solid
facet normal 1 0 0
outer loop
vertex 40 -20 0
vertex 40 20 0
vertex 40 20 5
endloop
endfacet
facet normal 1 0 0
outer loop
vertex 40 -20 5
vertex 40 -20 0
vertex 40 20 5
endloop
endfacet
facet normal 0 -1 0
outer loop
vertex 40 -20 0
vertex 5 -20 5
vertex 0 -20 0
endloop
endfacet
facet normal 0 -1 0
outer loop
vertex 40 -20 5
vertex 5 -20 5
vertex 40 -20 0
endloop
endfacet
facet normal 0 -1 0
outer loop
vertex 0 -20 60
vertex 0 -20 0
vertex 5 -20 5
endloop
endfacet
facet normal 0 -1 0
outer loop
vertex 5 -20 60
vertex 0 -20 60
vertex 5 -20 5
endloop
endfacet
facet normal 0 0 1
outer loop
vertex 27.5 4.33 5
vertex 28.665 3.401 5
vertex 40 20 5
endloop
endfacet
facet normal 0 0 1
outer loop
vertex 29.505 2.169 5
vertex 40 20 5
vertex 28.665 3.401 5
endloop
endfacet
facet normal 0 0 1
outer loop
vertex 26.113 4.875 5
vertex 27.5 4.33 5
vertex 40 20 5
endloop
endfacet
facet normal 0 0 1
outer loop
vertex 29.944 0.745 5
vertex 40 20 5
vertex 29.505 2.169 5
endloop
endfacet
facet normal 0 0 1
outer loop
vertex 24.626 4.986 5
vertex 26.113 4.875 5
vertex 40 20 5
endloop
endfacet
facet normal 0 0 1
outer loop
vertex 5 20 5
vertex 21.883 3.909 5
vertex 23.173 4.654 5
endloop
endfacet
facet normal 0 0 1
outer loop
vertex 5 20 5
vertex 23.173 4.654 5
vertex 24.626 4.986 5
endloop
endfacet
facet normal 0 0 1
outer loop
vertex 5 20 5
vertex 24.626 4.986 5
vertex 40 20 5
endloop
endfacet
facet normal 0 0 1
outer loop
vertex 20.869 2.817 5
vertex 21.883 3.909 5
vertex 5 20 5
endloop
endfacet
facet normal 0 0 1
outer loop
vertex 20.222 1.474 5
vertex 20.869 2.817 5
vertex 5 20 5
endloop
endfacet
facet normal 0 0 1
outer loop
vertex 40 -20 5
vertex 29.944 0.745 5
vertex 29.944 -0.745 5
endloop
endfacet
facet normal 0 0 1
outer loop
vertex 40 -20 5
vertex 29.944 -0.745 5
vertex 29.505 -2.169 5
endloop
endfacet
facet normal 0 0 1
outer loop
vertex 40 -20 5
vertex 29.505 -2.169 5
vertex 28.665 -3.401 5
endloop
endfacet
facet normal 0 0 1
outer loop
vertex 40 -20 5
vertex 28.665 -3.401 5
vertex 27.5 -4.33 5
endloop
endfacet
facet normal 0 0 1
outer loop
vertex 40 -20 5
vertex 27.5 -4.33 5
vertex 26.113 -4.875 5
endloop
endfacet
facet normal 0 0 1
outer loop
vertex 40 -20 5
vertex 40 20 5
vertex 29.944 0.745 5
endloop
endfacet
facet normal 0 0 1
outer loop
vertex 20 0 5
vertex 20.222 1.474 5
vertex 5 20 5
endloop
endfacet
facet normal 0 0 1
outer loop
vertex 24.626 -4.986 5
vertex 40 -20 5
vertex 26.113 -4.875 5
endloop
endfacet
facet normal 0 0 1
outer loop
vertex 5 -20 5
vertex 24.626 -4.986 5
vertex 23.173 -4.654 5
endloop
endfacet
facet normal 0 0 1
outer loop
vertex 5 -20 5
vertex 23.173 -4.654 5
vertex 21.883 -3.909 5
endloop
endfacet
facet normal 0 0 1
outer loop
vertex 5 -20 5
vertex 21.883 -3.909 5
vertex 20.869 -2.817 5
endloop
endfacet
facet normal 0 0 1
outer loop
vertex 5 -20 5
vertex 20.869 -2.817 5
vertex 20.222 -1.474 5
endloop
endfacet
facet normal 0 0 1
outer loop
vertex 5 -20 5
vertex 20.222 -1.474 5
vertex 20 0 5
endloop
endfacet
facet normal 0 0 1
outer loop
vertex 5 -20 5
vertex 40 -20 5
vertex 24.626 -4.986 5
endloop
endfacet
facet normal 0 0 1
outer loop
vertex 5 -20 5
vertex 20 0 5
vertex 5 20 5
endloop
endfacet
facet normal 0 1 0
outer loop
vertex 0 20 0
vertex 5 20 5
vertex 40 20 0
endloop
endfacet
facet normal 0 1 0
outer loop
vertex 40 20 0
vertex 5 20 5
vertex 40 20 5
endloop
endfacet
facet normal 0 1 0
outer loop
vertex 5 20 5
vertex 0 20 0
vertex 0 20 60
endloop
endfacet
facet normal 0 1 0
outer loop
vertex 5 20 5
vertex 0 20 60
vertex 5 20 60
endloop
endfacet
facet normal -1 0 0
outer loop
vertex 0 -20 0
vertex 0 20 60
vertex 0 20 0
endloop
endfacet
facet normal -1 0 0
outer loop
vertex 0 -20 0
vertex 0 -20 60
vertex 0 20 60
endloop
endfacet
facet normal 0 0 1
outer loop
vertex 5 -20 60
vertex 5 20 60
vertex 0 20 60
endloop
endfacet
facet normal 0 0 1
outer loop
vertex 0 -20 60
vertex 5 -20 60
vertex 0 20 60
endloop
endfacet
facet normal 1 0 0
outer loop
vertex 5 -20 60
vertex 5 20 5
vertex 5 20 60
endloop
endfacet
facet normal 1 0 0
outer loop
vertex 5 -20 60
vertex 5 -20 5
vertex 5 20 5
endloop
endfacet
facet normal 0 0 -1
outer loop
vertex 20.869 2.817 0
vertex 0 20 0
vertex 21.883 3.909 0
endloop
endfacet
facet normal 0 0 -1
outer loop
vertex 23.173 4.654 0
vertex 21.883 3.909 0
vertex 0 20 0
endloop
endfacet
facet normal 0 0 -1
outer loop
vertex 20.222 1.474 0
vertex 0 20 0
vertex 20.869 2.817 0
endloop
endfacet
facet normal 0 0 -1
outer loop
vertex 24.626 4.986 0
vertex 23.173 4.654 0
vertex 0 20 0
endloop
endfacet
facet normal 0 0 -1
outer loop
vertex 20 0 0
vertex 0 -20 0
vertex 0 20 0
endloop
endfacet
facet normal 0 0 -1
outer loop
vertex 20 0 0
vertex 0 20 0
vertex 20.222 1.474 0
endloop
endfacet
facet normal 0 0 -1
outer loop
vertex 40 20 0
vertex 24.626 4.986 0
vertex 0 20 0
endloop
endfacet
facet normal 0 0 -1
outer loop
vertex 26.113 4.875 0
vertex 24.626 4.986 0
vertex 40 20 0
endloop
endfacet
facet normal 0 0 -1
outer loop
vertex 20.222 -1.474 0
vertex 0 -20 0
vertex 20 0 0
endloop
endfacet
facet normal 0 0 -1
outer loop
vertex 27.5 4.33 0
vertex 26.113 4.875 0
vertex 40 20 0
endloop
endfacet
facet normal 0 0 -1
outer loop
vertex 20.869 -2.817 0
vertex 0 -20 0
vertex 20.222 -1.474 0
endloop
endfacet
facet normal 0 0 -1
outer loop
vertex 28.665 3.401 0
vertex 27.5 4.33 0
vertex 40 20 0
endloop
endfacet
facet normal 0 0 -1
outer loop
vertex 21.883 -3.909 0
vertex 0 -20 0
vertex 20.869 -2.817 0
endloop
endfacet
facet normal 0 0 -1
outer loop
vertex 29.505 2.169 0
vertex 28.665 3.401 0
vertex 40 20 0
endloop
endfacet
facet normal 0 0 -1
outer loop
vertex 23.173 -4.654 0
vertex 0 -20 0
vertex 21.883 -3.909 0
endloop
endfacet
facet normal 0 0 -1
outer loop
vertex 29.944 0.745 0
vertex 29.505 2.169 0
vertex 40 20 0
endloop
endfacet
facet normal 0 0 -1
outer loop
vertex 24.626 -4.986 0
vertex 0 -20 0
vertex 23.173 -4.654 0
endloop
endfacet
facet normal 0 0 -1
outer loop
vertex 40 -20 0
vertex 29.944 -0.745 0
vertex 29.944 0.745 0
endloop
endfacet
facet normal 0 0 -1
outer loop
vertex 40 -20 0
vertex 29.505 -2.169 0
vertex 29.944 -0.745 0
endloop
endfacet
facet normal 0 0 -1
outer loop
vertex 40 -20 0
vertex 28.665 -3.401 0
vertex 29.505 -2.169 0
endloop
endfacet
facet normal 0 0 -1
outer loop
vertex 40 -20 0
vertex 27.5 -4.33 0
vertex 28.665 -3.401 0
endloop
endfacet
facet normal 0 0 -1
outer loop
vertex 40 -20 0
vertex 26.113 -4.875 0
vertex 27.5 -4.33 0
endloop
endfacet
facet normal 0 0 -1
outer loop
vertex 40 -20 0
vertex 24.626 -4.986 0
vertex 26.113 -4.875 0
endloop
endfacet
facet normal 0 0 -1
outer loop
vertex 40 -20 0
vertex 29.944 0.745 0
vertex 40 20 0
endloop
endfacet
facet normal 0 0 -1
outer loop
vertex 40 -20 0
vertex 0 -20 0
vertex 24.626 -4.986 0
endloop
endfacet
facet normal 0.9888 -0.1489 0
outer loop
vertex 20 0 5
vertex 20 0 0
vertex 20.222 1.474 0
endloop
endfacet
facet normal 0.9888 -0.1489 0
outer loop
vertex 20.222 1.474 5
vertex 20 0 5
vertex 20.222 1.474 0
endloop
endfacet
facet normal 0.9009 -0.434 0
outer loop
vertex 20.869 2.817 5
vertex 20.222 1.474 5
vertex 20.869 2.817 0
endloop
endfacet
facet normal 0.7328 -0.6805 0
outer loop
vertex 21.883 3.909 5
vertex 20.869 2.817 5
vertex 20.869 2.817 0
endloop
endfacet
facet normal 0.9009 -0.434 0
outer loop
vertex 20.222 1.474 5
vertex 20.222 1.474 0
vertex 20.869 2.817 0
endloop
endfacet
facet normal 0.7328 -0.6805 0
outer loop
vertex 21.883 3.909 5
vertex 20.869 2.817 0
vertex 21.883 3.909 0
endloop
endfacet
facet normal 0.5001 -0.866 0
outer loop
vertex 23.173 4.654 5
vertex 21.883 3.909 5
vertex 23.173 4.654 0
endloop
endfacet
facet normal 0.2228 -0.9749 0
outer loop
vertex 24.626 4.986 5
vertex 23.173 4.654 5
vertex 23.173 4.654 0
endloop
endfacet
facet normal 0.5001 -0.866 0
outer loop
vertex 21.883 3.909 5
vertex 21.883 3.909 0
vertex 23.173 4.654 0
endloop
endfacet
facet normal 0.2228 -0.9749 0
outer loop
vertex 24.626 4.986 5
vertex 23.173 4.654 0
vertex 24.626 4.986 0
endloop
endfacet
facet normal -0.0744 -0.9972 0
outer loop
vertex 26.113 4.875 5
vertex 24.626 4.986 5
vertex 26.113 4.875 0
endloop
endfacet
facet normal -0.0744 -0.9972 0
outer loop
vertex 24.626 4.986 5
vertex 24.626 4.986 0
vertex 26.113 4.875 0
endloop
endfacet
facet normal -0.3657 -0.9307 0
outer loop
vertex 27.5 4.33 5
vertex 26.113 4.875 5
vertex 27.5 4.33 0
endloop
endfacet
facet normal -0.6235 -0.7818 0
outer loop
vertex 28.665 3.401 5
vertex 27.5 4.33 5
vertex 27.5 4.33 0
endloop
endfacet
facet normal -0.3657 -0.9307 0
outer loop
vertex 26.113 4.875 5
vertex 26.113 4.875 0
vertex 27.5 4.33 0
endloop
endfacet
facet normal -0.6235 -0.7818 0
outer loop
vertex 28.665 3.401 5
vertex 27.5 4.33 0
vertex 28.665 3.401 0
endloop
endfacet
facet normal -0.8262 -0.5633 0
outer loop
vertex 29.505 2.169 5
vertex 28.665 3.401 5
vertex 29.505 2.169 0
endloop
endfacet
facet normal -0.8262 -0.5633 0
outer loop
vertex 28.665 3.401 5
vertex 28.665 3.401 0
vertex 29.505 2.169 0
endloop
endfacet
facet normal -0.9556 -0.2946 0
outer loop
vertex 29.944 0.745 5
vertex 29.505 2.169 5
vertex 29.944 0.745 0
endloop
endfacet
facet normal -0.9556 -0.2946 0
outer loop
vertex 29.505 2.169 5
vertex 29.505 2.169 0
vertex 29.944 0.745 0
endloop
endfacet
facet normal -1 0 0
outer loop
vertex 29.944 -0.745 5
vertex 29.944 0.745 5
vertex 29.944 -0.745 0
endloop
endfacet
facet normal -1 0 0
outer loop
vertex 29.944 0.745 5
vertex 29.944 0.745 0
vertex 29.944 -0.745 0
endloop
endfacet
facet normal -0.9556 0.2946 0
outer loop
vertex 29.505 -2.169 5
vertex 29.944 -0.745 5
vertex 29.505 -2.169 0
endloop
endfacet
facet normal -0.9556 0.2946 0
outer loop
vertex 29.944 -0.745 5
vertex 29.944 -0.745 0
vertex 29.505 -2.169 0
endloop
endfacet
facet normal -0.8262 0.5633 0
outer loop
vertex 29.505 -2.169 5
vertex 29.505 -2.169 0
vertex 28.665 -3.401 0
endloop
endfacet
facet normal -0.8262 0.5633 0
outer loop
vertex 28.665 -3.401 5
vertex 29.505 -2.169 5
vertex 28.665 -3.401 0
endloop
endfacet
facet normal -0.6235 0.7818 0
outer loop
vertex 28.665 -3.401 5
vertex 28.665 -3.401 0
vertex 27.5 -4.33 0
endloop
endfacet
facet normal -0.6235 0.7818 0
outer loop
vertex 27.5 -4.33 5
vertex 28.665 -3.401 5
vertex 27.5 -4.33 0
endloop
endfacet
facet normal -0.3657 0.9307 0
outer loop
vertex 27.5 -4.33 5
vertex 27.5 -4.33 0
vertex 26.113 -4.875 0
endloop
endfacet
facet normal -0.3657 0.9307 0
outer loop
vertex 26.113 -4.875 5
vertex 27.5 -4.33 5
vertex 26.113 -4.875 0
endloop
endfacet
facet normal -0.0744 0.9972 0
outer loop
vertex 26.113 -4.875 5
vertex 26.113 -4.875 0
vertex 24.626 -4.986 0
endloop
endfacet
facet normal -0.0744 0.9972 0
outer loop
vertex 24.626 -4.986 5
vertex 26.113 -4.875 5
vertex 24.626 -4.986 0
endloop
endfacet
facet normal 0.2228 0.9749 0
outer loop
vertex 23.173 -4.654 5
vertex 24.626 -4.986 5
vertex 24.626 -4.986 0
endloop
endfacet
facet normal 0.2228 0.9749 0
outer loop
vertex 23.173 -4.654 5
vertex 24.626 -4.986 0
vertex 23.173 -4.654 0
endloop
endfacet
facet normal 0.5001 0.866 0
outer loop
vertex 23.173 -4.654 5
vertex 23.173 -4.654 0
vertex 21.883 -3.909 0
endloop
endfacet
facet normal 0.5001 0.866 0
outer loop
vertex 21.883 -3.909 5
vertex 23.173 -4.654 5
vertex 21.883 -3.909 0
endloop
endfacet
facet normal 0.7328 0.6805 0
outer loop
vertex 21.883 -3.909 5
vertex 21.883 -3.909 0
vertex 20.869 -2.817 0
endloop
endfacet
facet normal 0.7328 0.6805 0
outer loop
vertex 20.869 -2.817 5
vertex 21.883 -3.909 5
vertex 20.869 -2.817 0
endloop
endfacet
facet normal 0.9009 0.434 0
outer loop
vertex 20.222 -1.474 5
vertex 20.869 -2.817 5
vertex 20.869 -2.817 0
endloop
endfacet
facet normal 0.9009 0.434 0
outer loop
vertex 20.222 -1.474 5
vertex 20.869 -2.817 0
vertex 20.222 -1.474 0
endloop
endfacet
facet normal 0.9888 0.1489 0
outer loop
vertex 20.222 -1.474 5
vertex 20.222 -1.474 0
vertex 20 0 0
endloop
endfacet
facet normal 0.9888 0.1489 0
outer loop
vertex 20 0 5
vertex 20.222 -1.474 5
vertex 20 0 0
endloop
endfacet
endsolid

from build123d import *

# Parameters (mm, degrees)
F1_DEPTH = 20
F3_D     = 10


with BuildPart() as f1:
    # F0 (on Front) → F1 (new body, symmetric)
    with BuildSketch(Plane.XZ):
        Polygon((0, 60), (0, 0), (40, 0), (40, 5), (5, 5), (5, 60), align=None)
    extrude(amount=F1_DEPTH, both=True)

    # F3 (through all)
    with Locations(Plane.XY.offset(5)):
        with Locations((25, 0)):
            Hole(F3_D / 2)


solid = f1.part
